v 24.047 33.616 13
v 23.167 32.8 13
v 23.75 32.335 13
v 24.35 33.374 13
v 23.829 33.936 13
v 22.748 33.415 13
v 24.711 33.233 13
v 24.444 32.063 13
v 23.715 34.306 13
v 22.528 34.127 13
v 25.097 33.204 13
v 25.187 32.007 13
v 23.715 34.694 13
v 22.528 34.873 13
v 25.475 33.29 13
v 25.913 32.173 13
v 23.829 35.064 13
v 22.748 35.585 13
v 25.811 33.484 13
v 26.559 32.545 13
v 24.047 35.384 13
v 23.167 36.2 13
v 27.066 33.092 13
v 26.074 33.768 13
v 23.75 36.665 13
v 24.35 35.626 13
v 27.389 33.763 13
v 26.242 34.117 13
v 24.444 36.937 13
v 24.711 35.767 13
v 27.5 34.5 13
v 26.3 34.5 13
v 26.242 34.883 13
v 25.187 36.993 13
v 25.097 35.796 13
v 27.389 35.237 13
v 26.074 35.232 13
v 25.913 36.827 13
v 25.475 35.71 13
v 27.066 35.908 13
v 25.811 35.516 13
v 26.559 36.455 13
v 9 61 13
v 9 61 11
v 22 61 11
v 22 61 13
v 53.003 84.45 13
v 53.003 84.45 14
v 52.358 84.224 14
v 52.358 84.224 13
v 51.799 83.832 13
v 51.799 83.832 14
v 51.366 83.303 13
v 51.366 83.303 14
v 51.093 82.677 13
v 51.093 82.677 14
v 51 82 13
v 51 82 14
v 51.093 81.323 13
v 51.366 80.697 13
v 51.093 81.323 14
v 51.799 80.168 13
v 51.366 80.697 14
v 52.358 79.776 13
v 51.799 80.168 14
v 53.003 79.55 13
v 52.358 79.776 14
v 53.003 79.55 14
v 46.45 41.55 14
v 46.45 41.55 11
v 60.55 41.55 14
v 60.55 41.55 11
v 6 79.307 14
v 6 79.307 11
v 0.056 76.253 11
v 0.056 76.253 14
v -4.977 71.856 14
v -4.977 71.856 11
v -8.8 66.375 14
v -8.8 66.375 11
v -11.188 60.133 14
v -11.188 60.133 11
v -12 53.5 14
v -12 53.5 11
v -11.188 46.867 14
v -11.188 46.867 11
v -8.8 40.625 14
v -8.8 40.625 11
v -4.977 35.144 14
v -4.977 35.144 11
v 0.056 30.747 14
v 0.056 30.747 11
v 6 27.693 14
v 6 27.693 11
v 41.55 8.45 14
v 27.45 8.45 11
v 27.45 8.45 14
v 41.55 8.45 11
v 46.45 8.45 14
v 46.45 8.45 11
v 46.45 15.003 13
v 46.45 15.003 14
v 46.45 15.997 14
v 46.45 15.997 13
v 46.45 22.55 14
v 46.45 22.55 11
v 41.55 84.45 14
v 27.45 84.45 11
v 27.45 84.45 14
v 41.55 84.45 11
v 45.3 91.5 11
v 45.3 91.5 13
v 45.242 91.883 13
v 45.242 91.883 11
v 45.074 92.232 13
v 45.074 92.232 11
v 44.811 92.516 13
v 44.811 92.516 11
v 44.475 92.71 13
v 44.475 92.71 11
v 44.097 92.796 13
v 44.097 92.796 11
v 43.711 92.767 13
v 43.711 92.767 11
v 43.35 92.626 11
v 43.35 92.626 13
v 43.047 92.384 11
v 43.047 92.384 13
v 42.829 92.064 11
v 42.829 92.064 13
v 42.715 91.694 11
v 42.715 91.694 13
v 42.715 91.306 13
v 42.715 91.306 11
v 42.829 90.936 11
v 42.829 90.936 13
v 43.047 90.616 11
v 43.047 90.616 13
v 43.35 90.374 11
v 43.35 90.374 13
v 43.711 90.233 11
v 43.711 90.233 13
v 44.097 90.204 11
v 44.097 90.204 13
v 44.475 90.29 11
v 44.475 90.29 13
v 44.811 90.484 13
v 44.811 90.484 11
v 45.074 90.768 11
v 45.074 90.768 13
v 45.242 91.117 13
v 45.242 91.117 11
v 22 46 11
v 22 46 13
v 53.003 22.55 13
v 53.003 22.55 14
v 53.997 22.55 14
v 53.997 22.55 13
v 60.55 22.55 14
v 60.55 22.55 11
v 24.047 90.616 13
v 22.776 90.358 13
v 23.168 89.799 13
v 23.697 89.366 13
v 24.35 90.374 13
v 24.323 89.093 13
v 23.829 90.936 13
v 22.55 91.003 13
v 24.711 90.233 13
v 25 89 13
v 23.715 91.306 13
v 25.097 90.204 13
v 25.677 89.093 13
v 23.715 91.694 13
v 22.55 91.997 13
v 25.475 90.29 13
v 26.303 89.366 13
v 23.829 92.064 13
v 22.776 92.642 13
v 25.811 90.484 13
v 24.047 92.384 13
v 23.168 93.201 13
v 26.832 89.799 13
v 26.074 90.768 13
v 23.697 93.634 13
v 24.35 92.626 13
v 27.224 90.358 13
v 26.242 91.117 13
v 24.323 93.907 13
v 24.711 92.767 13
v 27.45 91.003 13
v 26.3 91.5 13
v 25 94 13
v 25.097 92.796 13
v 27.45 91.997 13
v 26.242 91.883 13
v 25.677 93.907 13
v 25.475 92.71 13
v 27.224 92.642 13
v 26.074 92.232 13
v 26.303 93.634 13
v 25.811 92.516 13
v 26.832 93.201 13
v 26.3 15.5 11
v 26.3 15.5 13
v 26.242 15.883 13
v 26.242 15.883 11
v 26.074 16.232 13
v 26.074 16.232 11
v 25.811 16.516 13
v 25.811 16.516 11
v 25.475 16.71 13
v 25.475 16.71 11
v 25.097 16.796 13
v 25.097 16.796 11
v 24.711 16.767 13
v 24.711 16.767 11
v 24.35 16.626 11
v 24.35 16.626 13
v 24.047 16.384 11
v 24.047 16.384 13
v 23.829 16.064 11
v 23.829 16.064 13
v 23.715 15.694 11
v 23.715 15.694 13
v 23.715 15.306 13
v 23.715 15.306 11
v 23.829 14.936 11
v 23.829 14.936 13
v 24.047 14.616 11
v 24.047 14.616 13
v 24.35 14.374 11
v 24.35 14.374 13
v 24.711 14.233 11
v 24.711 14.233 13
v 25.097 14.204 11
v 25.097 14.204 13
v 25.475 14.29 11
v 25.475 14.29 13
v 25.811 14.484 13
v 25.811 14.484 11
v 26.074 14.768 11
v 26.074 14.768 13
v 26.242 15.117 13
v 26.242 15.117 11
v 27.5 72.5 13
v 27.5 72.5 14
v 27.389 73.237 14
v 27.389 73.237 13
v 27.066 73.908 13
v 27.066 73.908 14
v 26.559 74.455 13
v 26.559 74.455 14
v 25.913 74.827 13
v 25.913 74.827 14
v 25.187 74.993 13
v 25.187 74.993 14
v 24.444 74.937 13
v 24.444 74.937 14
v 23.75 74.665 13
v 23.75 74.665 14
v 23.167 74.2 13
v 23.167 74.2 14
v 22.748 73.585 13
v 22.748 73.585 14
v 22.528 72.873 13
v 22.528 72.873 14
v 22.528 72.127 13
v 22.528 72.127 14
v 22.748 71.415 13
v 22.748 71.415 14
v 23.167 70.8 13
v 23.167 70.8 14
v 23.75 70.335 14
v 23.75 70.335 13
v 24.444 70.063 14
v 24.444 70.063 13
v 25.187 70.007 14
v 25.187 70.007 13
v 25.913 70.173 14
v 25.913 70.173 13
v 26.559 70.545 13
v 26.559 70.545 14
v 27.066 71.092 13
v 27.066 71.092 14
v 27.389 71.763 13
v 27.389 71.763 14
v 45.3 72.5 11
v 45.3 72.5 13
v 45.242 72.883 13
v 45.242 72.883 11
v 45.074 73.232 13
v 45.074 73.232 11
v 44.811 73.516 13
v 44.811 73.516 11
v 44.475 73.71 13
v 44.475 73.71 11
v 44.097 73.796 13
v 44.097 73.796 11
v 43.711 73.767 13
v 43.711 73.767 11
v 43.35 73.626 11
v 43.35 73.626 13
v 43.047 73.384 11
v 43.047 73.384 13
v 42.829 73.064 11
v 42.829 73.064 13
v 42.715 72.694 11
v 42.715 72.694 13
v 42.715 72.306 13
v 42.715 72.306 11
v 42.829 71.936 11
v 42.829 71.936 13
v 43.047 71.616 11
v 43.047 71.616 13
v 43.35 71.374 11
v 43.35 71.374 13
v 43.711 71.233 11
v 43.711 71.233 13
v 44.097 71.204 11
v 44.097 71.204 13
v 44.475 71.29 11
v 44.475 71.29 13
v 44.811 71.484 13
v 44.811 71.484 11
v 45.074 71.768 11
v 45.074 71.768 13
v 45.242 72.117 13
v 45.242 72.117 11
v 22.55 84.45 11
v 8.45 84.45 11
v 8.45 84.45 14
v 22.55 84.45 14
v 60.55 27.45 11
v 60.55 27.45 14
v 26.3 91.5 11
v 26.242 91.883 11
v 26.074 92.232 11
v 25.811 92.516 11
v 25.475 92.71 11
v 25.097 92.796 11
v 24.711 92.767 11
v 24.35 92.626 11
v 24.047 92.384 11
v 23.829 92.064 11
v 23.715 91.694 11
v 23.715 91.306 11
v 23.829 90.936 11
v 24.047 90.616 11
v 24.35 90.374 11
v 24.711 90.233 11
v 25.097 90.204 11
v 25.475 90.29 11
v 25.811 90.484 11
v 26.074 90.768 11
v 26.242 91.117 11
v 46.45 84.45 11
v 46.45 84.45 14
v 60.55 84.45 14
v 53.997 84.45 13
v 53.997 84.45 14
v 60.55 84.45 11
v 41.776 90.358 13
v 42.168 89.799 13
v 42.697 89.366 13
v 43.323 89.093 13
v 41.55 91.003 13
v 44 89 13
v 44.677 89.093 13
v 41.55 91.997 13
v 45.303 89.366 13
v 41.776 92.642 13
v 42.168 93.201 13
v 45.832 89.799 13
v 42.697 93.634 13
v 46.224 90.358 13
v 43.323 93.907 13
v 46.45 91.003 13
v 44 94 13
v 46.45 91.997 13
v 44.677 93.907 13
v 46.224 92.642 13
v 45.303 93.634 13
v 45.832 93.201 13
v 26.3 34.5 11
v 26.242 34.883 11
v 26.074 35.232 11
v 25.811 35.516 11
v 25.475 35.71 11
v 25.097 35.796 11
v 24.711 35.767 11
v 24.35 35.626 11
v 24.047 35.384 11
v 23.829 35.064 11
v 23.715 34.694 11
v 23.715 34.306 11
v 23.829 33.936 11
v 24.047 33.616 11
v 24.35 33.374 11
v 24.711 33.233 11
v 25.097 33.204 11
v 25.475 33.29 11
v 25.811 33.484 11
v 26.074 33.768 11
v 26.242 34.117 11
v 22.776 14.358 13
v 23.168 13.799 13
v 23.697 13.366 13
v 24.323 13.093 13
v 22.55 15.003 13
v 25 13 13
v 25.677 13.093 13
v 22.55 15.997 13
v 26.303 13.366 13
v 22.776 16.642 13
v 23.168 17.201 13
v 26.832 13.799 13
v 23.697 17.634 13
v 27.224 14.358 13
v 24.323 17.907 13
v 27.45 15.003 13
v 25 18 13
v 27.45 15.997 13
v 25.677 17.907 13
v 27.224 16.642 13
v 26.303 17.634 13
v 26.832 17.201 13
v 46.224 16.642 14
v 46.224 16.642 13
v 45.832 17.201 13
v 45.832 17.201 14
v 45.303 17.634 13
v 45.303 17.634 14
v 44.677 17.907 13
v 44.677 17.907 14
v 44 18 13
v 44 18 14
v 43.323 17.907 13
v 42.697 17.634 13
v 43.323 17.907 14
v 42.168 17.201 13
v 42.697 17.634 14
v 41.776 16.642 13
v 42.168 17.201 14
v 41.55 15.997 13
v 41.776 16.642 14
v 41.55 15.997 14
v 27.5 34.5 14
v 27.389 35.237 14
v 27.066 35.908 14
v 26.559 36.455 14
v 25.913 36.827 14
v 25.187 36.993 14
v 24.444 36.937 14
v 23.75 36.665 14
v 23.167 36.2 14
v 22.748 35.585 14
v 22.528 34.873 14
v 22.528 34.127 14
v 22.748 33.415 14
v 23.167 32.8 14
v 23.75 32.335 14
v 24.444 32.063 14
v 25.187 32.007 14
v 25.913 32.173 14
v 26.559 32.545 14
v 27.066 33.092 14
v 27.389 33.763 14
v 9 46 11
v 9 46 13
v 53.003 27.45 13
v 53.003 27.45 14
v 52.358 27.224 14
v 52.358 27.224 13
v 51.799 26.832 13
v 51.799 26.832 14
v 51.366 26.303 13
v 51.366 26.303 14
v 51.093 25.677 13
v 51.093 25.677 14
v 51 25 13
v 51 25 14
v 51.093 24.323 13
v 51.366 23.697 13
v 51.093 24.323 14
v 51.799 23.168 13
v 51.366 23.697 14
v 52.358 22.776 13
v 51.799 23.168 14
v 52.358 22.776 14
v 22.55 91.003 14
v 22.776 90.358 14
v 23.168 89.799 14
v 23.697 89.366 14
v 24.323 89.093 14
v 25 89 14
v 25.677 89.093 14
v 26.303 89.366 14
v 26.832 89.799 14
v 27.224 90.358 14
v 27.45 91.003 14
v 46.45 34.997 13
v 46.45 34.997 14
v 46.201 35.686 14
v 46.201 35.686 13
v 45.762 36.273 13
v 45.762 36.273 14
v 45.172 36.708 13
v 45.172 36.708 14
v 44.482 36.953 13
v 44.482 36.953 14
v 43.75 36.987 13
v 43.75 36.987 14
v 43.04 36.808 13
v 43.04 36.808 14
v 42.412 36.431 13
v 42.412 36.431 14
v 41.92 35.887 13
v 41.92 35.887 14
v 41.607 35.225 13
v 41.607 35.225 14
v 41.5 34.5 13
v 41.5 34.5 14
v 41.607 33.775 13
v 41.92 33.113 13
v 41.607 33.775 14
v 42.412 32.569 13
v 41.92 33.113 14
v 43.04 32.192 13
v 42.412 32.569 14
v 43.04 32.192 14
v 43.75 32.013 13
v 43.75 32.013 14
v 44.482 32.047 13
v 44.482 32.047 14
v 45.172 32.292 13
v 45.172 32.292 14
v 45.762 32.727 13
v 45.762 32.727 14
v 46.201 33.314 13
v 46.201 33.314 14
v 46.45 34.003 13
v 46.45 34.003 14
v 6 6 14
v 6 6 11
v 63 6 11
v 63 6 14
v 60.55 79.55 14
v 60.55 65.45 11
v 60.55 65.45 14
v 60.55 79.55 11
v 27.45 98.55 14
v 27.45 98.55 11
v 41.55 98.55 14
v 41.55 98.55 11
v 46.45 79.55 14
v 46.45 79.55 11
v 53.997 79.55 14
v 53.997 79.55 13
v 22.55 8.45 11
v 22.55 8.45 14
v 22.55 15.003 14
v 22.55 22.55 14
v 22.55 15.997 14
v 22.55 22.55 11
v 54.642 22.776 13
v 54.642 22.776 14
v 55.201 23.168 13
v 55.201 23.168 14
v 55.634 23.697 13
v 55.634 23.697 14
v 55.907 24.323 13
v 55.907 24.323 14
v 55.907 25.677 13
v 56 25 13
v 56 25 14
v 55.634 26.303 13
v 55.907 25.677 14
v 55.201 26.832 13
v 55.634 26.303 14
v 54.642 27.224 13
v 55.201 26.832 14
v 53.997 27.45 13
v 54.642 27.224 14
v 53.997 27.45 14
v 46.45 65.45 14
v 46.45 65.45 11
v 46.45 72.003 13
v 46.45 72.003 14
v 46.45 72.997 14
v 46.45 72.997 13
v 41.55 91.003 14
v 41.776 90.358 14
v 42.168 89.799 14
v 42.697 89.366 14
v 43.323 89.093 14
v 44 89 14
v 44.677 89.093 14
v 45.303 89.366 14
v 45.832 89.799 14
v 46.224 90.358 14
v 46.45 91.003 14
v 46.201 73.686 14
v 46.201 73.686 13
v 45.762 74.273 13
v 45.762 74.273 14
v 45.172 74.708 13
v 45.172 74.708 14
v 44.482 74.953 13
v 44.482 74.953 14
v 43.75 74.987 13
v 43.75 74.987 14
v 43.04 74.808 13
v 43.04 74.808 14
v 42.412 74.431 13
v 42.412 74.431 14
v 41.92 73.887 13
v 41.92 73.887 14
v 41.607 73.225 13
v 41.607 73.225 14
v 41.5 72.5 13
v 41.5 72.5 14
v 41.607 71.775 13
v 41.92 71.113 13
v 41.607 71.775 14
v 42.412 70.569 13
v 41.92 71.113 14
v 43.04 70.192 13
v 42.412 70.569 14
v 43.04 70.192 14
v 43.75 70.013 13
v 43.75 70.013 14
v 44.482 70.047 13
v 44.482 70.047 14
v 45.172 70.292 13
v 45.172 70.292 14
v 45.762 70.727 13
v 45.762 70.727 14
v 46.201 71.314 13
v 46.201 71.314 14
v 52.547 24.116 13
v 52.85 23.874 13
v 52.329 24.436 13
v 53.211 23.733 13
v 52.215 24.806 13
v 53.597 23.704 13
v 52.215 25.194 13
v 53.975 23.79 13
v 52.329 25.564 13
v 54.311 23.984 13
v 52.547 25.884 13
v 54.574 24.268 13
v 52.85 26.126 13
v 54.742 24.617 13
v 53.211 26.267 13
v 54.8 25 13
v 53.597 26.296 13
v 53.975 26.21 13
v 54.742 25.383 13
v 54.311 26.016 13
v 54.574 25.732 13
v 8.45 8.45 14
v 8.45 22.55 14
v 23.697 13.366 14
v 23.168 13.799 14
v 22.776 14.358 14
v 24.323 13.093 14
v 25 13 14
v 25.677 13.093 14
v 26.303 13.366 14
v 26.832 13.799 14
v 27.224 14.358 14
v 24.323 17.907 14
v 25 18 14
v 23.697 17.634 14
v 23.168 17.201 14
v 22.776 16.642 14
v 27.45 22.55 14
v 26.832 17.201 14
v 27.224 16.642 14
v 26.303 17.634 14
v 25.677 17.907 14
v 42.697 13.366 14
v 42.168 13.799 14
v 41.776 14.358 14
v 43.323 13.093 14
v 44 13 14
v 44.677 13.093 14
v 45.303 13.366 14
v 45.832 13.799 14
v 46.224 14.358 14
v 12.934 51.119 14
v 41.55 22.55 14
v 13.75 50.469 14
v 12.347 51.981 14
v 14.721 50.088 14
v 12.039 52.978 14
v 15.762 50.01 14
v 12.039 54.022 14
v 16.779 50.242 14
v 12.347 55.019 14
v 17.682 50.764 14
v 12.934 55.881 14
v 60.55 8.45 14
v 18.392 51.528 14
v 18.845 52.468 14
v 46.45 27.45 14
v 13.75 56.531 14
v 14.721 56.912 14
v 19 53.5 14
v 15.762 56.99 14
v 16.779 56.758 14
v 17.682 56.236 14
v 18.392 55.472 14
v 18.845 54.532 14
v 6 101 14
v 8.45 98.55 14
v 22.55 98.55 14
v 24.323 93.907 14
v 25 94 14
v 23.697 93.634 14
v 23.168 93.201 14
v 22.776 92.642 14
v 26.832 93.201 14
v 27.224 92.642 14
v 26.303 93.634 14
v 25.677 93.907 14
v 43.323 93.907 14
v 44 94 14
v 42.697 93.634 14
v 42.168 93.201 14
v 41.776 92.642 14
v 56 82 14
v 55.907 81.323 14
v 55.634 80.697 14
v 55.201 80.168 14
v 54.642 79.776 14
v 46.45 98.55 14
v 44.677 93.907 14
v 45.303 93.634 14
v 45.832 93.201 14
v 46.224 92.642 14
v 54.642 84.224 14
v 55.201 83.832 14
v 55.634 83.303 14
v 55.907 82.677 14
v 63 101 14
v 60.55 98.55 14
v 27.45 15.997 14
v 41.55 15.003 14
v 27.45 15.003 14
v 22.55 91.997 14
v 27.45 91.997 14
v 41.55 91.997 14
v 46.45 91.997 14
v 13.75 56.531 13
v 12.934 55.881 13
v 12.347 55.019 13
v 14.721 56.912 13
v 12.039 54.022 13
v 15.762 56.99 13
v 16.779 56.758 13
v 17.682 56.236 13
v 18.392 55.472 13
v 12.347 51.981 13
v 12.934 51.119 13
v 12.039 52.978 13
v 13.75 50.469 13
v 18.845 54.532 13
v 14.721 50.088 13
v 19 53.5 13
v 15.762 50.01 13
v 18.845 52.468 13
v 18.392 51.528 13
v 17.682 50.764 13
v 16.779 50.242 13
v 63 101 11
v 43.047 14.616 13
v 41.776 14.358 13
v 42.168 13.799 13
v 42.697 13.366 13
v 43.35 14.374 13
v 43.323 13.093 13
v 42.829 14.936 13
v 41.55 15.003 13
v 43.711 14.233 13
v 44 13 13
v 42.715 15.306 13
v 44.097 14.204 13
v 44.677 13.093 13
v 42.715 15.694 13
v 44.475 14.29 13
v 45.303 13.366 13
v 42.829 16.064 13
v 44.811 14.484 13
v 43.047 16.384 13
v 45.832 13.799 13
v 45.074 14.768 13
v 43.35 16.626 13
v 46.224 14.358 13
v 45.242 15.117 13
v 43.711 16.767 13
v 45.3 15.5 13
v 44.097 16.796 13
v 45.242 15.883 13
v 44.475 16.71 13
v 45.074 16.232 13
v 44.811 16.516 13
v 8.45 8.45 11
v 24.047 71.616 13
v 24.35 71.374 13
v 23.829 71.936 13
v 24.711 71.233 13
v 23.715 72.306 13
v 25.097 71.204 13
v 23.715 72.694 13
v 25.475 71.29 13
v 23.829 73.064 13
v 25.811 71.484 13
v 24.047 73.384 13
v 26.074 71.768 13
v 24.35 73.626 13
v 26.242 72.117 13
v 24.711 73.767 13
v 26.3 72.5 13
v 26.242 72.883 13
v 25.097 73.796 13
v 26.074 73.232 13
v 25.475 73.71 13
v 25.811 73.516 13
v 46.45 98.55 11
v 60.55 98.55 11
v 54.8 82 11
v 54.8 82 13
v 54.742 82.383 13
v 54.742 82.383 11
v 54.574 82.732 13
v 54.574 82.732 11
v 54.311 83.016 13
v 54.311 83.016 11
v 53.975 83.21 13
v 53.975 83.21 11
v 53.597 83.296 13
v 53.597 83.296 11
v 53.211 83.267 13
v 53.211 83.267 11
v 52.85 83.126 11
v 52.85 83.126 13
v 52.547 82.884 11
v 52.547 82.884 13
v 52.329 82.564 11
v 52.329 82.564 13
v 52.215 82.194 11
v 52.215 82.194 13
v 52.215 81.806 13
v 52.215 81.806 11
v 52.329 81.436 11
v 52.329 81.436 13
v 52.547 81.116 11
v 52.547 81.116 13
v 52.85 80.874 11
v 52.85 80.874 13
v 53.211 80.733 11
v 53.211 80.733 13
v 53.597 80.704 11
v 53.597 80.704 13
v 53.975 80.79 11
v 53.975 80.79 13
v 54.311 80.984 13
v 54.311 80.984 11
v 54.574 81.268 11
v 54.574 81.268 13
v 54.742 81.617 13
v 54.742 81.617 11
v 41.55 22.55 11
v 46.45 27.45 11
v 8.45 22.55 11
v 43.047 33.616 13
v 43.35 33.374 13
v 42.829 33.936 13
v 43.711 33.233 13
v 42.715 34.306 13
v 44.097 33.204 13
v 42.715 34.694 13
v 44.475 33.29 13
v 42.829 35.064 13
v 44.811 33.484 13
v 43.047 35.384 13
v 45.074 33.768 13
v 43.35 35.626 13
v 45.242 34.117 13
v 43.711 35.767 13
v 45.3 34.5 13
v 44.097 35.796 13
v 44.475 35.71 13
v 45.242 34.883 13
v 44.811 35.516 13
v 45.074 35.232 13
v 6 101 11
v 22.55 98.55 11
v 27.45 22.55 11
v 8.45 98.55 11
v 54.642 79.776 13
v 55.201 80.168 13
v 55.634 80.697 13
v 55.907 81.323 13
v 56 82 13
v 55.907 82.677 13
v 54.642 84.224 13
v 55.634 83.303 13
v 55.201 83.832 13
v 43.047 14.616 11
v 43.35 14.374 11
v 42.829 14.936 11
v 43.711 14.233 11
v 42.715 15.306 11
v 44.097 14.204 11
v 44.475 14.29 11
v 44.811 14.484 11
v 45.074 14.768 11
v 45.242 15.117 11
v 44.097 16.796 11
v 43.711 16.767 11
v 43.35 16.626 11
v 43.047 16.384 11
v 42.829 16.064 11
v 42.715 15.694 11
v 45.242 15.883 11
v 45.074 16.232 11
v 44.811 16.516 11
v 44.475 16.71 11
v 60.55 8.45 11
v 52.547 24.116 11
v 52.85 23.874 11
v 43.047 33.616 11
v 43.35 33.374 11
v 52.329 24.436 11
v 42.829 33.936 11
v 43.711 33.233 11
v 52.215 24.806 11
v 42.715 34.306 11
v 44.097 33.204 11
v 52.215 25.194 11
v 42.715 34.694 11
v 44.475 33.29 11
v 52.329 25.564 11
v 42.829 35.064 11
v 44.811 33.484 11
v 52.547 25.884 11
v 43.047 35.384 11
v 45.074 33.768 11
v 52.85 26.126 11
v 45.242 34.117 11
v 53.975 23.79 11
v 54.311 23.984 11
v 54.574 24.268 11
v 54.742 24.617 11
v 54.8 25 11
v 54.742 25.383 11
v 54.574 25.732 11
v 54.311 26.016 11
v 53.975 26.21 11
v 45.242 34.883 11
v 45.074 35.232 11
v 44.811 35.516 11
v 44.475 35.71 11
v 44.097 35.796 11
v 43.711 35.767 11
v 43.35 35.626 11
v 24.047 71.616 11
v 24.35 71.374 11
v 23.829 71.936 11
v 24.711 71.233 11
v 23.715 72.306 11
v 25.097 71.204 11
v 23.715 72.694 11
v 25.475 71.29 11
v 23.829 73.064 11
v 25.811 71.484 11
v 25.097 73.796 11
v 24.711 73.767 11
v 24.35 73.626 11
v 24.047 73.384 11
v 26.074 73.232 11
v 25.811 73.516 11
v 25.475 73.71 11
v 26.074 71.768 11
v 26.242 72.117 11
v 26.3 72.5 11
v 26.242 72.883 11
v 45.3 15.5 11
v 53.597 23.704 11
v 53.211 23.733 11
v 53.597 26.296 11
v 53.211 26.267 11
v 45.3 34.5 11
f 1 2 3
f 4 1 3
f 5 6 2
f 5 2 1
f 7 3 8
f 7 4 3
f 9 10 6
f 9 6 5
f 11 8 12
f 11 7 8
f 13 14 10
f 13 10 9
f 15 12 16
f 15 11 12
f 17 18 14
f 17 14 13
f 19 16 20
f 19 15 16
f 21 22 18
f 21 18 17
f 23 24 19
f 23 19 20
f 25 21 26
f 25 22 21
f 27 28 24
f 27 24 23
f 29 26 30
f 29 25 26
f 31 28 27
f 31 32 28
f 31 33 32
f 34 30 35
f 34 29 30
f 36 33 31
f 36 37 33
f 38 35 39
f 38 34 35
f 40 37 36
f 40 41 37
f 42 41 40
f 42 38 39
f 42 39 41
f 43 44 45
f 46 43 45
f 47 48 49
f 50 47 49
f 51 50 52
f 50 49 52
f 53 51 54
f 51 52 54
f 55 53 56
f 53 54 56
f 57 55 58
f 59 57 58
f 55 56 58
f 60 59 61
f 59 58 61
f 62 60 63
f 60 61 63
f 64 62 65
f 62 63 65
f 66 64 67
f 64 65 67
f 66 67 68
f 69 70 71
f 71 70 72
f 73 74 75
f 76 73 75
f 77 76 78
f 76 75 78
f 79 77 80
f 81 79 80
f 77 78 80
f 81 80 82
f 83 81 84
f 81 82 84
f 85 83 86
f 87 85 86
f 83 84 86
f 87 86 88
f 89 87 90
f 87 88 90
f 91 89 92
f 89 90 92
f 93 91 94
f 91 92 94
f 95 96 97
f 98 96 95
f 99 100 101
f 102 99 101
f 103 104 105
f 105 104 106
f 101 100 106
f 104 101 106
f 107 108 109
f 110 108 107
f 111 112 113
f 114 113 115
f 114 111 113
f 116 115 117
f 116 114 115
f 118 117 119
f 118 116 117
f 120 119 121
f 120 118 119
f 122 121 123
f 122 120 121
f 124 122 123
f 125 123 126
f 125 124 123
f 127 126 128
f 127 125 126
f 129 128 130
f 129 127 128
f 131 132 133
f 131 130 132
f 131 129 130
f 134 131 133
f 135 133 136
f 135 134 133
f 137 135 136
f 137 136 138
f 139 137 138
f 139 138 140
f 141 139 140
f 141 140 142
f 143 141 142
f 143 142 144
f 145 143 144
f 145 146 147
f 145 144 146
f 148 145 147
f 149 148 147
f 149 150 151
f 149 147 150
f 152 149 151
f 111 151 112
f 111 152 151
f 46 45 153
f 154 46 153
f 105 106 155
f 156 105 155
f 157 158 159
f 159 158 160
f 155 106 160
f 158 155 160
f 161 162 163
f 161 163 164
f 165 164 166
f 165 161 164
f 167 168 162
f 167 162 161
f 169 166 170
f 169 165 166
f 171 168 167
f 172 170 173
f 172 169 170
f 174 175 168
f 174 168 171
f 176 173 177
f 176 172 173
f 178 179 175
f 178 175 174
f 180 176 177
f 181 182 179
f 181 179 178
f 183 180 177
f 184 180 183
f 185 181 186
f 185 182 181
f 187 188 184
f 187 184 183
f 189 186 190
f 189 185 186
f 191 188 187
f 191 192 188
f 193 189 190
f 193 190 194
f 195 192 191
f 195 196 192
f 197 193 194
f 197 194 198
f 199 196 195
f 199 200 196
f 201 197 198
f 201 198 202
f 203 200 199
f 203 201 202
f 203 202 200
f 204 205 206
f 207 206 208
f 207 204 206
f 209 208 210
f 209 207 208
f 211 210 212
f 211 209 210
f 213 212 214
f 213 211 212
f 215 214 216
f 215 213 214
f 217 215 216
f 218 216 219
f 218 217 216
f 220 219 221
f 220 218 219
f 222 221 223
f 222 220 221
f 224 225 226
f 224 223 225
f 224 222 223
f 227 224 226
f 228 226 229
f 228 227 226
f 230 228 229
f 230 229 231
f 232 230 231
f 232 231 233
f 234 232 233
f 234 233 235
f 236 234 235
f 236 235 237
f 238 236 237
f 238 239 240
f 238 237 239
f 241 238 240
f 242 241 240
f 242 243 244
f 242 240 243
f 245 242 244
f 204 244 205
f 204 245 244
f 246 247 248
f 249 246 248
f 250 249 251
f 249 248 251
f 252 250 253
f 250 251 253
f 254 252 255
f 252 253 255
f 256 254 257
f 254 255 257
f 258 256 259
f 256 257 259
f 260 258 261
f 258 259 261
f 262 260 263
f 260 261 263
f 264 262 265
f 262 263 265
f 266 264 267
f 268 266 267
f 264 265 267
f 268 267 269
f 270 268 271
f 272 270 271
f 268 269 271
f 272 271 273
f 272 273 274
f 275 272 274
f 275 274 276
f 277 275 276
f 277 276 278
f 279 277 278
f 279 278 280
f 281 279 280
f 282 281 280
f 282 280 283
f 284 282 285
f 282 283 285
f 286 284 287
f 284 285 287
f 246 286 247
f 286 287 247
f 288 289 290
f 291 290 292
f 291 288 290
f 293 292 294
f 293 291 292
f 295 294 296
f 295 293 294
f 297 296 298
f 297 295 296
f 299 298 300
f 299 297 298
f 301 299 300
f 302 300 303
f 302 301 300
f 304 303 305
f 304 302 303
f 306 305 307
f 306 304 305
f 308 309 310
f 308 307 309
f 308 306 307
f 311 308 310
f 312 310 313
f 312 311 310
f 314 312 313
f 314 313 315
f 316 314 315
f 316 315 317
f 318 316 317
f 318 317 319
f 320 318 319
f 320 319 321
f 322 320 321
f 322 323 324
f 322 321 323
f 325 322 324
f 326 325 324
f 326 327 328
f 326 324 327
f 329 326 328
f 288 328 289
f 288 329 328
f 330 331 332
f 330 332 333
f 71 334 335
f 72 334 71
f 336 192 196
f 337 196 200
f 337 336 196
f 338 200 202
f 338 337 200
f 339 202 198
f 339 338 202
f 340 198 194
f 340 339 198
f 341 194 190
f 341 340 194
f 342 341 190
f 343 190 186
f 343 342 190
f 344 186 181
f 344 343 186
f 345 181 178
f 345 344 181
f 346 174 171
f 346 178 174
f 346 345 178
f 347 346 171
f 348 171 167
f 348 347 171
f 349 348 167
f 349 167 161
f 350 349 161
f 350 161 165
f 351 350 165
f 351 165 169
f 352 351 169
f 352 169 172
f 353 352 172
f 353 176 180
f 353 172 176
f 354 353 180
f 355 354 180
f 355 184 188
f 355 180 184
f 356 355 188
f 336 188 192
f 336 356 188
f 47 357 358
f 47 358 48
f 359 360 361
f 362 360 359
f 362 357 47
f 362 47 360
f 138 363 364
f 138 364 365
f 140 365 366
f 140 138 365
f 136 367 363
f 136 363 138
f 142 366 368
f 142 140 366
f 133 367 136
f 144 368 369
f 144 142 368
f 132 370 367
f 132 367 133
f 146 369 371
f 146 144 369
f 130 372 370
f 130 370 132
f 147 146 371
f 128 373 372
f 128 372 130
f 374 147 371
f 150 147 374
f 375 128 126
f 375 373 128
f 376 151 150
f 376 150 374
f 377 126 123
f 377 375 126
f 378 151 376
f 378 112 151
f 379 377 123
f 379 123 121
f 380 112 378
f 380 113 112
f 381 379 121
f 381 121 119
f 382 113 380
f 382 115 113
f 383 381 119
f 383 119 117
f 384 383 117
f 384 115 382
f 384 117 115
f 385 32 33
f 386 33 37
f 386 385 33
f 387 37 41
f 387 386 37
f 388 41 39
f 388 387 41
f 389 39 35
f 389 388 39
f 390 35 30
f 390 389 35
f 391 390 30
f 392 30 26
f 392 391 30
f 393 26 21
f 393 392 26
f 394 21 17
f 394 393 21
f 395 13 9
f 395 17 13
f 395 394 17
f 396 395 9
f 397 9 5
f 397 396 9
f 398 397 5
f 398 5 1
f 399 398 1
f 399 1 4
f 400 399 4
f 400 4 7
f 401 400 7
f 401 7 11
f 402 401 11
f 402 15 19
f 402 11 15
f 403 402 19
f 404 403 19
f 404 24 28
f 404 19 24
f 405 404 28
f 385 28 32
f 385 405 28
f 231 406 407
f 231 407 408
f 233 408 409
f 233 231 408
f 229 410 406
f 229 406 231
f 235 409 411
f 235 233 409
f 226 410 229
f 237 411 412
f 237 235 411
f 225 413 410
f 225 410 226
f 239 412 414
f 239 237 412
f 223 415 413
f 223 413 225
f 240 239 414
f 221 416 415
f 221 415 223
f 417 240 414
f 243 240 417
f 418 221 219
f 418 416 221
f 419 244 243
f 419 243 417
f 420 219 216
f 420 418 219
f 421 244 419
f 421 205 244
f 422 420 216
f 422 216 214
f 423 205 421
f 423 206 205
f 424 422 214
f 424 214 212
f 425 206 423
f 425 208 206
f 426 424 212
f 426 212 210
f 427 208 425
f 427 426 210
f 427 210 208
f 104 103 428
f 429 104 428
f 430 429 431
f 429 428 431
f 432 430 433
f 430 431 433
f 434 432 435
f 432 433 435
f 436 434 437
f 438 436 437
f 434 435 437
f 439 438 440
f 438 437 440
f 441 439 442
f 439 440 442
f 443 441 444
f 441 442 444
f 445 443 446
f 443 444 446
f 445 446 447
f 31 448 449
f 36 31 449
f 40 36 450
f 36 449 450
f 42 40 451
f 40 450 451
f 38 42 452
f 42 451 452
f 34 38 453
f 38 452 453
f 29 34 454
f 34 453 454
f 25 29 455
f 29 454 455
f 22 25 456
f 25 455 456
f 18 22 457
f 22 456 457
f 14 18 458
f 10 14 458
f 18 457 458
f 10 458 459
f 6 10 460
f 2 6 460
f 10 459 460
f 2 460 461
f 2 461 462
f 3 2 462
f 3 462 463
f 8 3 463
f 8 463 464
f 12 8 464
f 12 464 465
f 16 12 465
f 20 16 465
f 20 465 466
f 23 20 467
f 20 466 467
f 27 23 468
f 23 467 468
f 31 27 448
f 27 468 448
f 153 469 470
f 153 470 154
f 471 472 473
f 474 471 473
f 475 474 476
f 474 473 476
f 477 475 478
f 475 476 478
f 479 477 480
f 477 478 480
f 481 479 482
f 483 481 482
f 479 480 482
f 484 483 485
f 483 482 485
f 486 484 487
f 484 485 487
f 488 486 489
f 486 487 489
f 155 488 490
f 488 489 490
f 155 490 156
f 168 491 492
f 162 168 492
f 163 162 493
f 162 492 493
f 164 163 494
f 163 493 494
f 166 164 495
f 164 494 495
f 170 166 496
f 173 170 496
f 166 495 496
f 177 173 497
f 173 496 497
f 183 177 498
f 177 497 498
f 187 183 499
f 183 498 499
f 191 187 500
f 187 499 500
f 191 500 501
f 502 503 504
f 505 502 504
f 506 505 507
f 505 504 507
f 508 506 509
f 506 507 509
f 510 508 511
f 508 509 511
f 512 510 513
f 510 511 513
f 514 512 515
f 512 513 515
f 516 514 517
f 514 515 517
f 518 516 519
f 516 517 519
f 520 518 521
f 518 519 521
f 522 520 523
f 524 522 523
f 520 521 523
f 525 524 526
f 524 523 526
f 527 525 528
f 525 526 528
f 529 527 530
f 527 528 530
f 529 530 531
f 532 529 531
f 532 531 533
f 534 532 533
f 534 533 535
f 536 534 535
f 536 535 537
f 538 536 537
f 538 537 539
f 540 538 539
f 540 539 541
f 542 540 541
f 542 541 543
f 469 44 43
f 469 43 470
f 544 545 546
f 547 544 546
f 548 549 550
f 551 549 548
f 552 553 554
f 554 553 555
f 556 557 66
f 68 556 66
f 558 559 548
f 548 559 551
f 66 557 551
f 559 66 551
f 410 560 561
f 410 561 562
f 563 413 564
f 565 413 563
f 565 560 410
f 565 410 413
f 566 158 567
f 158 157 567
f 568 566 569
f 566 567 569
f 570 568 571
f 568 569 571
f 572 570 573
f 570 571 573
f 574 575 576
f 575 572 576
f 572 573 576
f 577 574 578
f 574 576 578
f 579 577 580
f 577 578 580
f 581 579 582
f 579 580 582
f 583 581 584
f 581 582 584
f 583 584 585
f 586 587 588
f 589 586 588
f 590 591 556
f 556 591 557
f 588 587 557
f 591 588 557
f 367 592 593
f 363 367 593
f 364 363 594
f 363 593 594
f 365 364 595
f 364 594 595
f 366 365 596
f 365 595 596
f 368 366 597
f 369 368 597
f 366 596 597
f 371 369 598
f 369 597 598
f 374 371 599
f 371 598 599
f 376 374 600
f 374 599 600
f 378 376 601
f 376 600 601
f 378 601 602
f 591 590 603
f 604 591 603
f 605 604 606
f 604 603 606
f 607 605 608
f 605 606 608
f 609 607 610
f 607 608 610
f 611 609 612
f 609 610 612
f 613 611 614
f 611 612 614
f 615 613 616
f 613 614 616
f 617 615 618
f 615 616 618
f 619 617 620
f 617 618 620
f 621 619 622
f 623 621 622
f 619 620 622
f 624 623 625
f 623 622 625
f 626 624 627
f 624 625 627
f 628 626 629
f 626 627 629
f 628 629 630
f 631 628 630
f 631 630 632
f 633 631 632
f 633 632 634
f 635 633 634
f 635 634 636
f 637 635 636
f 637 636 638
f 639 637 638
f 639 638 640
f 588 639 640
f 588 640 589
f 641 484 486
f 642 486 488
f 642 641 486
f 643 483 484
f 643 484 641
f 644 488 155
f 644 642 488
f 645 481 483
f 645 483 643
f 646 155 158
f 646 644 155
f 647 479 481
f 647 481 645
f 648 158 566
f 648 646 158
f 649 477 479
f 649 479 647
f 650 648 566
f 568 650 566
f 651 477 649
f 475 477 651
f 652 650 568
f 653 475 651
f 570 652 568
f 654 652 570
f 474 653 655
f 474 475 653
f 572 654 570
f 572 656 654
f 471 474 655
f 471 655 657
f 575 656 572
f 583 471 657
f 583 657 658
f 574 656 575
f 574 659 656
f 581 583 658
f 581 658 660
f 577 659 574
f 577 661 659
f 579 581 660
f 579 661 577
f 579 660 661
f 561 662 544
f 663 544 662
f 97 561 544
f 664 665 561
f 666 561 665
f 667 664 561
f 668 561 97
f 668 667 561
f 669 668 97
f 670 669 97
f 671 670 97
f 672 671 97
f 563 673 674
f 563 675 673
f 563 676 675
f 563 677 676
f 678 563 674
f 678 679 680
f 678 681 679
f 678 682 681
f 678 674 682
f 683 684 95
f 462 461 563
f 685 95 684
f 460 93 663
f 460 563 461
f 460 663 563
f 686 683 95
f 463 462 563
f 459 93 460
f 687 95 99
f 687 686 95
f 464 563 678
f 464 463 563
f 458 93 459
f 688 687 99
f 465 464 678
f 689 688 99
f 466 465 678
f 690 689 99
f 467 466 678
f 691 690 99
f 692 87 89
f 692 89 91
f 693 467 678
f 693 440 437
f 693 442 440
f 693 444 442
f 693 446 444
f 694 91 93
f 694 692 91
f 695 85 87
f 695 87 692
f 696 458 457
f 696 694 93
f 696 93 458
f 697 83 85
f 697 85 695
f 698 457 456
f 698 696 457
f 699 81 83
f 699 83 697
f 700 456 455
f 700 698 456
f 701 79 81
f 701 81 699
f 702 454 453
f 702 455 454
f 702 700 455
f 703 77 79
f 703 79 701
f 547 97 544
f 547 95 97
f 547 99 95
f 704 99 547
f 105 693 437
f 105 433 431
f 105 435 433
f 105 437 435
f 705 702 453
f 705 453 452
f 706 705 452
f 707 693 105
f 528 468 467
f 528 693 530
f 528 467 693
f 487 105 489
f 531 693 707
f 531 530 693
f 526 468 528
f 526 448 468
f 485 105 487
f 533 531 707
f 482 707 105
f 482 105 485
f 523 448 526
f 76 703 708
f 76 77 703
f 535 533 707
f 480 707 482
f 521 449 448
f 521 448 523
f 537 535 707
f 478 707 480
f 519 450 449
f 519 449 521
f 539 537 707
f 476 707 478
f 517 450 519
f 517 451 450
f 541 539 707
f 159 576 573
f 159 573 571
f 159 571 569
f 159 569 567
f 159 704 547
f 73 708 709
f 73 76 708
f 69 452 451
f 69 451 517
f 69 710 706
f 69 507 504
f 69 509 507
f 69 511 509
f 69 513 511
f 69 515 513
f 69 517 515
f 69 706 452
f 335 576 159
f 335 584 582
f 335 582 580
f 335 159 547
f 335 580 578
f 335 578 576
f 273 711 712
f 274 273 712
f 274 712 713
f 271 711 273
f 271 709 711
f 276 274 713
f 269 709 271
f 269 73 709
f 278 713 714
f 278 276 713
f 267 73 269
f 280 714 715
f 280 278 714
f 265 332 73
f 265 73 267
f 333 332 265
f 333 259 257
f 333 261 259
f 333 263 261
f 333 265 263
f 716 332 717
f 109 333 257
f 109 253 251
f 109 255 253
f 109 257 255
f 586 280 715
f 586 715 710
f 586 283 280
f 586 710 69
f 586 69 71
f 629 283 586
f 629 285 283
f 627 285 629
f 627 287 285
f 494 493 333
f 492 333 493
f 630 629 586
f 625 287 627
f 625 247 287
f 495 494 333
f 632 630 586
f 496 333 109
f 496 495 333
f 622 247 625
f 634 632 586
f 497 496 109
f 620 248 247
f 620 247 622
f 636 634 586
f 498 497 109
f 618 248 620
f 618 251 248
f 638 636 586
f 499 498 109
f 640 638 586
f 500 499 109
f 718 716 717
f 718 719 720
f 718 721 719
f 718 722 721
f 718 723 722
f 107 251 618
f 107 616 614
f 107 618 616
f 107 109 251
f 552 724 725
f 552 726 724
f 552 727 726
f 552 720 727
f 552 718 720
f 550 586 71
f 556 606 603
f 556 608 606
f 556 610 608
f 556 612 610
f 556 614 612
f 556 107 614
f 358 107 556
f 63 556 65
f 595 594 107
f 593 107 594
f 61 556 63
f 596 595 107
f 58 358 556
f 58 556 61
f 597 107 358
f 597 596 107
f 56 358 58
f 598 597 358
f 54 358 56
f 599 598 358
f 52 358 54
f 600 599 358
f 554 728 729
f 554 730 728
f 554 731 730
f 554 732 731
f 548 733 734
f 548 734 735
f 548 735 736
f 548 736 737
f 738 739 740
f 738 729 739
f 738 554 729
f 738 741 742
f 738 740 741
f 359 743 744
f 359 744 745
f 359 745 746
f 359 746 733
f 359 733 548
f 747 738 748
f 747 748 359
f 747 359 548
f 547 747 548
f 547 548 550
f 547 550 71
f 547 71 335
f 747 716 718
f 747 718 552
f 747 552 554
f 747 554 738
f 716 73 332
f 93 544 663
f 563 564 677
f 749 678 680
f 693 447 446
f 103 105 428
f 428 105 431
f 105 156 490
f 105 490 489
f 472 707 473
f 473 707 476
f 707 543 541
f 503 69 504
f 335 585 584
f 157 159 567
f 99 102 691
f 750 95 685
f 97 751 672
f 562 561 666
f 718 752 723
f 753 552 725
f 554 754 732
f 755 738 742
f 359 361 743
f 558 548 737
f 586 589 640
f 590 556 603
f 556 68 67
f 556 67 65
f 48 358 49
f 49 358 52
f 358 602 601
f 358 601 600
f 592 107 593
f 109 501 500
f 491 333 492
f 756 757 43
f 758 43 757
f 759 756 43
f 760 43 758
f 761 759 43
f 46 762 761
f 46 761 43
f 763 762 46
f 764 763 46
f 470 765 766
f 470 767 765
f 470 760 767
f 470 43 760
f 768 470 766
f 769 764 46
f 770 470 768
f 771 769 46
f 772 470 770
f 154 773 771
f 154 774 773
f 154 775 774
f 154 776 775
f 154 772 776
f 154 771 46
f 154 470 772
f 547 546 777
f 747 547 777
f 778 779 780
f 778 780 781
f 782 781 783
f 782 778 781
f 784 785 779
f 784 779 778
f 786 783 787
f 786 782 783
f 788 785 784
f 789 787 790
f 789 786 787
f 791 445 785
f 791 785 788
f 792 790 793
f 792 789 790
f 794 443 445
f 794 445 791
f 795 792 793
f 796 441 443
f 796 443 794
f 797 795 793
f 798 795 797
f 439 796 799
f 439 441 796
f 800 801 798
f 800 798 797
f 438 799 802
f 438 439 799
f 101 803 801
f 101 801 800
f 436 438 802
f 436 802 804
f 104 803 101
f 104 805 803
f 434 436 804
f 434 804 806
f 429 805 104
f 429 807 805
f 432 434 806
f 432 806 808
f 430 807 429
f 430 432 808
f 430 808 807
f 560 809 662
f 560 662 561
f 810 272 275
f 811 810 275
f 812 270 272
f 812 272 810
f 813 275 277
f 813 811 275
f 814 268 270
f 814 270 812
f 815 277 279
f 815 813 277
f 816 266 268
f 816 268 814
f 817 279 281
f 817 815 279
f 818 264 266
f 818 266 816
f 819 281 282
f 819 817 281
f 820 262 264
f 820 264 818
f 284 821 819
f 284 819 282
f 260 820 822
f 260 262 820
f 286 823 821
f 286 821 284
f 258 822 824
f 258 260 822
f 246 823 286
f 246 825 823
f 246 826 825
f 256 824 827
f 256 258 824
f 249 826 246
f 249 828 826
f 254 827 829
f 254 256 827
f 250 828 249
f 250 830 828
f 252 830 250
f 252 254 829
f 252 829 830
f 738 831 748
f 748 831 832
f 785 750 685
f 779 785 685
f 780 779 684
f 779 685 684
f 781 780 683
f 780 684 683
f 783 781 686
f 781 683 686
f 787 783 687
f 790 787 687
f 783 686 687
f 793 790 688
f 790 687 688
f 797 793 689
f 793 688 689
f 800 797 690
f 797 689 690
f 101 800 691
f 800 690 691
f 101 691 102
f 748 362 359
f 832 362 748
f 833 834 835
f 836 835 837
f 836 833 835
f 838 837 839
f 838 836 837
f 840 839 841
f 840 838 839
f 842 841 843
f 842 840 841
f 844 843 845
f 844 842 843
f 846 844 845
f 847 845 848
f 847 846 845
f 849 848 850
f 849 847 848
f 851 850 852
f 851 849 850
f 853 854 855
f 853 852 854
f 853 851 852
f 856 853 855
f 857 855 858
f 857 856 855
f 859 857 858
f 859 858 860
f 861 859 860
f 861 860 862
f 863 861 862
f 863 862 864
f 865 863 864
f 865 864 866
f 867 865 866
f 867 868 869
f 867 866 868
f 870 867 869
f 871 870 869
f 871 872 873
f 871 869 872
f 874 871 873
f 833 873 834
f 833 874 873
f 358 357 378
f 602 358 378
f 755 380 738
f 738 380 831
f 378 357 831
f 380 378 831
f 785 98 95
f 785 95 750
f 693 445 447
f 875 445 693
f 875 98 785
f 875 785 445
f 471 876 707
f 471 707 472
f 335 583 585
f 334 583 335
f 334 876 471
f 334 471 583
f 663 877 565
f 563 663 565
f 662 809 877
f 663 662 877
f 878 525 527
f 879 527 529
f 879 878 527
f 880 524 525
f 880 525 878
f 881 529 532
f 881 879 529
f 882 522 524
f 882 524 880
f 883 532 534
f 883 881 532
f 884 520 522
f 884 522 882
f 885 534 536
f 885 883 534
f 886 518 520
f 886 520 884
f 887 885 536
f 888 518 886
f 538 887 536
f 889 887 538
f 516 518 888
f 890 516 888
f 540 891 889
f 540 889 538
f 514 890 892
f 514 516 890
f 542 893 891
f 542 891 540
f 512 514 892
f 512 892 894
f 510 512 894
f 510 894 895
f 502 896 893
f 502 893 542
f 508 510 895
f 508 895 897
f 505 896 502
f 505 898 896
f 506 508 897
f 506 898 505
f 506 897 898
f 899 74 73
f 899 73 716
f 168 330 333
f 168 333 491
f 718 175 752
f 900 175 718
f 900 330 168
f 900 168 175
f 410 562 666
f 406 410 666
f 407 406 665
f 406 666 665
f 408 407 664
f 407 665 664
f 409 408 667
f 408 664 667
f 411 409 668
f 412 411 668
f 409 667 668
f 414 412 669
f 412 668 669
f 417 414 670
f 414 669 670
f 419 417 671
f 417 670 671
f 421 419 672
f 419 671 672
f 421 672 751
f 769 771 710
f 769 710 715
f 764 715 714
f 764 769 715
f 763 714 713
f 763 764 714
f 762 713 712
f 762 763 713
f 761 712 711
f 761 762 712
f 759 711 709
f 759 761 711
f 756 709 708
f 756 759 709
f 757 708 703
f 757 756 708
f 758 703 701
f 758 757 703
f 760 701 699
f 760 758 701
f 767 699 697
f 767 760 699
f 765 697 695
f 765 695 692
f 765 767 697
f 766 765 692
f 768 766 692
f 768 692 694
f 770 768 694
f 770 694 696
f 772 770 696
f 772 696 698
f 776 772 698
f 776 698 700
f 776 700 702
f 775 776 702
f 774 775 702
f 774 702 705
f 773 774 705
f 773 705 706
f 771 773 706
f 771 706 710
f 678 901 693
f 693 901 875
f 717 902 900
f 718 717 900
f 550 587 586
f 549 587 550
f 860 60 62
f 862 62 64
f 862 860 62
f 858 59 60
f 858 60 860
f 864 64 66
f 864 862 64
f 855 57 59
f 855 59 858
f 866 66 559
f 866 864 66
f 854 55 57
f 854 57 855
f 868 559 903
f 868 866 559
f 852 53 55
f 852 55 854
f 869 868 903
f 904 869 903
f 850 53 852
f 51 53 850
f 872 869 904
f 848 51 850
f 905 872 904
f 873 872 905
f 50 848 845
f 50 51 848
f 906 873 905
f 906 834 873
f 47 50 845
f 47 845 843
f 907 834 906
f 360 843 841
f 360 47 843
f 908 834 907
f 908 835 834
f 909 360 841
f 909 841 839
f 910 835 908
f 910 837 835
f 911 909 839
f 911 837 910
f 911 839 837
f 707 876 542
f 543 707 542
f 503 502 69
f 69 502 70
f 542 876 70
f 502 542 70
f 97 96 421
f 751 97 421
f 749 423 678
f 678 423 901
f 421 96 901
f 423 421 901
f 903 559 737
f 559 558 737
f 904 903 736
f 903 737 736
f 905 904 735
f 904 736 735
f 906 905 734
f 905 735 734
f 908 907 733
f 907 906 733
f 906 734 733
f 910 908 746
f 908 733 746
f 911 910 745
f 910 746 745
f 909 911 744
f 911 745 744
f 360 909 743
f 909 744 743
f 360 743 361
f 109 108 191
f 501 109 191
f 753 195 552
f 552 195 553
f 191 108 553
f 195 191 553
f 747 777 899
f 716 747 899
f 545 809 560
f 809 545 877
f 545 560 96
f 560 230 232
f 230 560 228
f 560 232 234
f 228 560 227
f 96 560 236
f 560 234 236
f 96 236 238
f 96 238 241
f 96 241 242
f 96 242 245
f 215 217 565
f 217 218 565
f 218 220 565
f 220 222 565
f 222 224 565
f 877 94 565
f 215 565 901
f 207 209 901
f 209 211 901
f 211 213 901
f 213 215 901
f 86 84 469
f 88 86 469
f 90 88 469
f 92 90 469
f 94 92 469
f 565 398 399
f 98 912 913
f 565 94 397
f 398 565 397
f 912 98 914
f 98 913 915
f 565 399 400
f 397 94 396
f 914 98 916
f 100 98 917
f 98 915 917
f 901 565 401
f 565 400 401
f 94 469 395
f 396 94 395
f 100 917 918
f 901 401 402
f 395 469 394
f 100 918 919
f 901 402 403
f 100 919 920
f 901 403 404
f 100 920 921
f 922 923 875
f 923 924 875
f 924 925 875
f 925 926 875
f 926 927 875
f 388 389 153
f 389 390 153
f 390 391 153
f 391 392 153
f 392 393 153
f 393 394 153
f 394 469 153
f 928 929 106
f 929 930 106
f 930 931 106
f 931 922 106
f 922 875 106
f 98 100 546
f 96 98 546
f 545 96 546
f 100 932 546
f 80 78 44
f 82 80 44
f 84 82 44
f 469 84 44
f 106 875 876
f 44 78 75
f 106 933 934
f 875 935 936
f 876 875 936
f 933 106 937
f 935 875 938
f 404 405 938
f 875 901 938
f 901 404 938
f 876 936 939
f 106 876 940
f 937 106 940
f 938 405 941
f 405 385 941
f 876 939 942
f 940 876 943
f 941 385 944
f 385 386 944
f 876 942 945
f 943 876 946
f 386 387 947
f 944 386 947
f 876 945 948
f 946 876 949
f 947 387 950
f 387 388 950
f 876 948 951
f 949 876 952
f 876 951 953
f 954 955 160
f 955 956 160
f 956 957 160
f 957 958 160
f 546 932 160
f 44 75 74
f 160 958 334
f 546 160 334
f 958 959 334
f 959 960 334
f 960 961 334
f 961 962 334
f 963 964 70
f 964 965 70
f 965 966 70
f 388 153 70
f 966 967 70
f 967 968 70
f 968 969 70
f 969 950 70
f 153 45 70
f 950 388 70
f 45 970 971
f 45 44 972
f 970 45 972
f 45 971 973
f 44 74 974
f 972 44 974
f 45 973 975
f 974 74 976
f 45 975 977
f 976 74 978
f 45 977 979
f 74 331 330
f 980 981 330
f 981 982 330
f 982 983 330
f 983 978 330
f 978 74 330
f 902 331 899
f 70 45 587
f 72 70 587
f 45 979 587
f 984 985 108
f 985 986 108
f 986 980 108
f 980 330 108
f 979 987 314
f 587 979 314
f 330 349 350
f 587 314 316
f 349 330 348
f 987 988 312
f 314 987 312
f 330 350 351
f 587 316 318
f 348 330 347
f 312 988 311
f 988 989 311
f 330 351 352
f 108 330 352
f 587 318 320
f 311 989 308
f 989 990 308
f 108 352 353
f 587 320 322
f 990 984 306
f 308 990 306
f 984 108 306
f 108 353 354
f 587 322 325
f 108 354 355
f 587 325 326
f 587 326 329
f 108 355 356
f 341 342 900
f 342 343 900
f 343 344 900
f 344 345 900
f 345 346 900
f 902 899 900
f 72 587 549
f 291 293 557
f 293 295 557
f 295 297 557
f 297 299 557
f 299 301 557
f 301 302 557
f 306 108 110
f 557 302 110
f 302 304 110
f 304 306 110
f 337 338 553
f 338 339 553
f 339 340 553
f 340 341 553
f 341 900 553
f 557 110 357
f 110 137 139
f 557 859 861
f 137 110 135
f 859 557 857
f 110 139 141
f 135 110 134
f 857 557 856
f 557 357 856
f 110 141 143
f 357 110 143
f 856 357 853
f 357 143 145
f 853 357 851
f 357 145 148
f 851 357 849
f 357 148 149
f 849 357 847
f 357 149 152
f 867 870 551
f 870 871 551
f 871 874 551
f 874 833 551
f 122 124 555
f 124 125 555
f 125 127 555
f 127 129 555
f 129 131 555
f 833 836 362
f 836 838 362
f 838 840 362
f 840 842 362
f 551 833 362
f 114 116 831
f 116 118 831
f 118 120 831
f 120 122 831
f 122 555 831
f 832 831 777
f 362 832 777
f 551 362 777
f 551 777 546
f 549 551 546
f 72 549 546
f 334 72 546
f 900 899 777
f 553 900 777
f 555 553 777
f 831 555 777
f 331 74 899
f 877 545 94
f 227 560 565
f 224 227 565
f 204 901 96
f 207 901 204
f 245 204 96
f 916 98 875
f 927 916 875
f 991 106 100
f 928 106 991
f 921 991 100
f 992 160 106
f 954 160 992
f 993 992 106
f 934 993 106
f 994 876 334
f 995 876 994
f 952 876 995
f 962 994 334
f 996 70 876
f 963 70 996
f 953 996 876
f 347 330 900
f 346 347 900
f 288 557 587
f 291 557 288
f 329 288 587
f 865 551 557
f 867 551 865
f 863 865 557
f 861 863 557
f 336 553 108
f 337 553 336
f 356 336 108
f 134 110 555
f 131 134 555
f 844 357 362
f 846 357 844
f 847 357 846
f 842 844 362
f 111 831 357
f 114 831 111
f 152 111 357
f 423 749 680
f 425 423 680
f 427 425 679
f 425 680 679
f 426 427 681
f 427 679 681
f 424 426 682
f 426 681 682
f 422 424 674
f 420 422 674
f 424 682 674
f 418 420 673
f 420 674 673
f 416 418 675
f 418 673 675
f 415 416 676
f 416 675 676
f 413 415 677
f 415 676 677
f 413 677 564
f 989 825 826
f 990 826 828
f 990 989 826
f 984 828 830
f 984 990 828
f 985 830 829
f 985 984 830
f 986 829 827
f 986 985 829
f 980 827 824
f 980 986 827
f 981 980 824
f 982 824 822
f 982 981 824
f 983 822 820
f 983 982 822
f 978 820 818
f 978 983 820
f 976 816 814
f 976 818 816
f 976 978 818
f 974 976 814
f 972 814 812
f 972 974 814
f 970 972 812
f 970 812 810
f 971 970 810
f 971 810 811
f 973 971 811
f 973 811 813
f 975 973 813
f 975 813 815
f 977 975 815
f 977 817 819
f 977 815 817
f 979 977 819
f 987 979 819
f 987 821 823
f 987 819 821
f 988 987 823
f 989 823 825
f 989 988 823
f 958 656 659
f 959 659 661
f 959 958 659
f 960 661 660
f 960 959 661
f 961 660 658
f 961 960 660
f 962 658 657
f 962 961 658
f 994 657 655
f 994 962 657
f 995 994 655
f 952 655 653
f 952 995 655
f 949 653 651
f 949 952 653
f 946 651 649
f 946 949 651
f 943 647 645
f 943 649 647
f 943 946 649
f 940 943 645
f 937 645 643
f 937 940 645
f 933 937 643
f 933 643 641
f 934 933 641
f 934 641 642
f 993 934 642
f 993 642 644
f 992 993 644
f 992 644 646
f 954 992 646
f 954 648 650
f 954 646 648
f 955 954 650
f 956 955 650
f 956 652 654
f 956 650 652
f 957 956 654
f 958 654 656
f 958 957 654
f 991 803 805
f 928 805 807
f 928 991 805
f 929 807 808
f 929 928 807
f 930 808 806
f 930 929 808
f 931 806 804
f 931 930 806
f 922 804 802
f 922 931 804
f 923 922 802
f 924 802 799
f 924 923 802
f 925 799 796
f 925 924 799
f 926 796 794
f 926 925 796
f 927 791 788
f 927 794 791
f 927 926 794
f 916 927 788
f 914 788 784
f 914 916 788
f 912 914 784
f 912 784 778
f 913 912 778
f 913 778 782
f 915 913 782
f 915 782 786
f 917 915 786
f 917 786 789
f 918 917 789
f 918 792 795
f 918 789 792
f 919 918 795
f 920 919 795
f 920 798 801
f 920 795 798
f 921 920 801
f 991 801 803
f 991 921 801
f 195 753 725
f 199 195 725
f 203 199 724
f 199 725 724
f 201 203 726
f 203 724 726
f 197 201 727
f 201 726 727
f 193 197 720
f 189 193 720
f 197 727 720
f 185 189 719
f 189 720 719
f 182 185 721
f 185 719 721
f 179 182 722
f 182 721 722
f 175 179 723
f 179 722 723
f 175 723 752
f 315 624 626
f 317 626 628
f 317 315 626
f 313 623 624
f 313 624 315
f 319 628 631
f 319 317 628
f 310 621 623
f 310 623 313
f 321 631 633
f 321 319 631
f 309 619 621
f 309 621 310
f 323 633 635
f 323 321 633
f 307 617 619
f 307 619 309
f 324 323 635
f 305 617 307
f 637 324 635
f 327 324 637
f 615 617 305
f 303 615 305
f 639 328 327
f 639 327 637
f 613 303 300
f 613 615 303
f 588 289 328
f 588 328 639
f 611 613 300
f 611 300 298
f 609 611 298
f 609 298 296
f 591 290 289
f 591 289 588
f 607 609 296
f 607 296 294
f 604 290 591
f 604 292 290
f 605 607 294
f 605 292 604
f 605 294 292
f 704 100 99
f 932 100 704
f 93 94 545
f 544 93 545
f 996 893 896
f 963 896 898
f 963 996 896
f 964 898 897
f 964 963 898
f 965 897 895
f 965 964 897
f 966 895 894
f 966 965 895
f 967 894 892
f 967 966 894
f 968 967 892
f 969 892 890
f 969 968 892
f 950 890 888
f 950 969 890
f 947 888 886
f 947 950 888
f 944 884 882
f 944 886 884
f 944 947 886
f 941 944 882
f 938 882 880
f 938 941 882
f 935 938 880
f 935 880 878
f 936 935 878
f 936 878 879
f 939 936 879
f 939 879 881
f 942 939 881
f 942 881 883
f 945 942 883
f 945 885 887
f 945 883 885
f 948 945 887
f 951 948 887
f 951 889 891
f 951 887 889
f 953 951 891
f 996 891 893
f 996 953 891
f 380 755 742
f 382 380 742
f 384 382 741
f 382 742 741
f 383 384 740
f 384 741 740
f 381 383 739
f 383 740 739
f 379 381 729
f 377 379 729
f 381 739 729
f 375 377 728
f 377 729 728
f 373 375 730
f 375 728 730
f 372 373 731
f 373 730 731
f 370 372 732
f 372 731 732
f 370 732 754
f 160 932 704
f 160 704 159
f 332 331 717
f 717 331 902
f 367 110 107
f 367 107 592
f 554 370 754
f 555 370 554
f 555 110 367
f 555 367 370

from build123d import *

# Parameters (mm, degrees)
SKETCH014_R     = 3.5
SKETCH014_R_2   = 1.3
SKETCH014_W     = 14.1
SKETCH014_H     = 14.1
PAD004_DEPTH    = 3
SKETCH015_R     = 2.5
POCKET009_DEPTH = 1
SKETCH016_W     = 13
SKETCH016_H     = 15
POCKET010_DEPTH = 2


with BuildPart() as part:
    # Sketch014 → Pad004 (new body)
    with BuildSketch(Plane.XY):
        with BuildLine():
            Line((0, 0), (57, 0))
            Line((57, 0), (57, 95))
            Line((57, 95), (0, 95))
            Line((0, 73.306976), (0, 95))
            ThreePointArc((0, 73.306976), (-18, 47.5), (0, 21.693024))
            Line((0, 21.693024), (0, 0))
        make_face()
        with Locations((9.5, 47.5)):
            Circle(SKETCH014_R, mode=Mode.SUBTRACT)
        with Locations((19, 85.5)):
            Circle(SKETCH014_R_2, mode=Mode.SUBTRACT)
        with Locations((38, 85.5)):
            Circle(SKETCH014_R_2, mode=Mode.SUBTRACT)
        with Locations((38, 66.5)):
            Circle(SKETCH014_R_2, mode=Mode.SUBTRACT)
        with Locations((19, 66.5)):
            Circle(SKETCH014_R_2, mode=Mode.SUBTRACT)
        with Locations((38, 28.5)):
            Circle(SKETCH014_R_2, mode=Mode.SUBTRACT)
        with Locations((19, 28.5)):
            Circle(SKETCH014_R_2, mode=Mode.SUBTRACT)
        with Locations((19, 9.5)):
            Circle(SKETCH014_R_2, mode=Mode.SUBTRACT)
        with Locations((38, 9.5)):
            Circle(SKETCH014_R_2, mode=Mode.SUBTRACT)
        with Locations((47.5, 19)):
            Circle(SKETCH014_R_2, mode=Mode.SUBTRACT)
        with Locations((47.5, 76)):
            Circle(SKETCH014_R_2, mode=Mode.SUBTRACT)
        with Locations((9.5, 9.5)):
            Rectangle(SKETCH014_W, SKETCH014_H, mode=Mode.SUBTRACT)
        with Locations((28.5, 9.5)):
            Rectangle(SKETCH014_W, SKETCH014_H, mode=Mode.SUBTRACT)
        with Locations((47.5, 9.5)):
            Rectangle(SKETCH014_W, SKETCH014_H, mode=Mode.SUBTRACT)
        with Locations((47.5, 28.5)):
            Rectangle(SKETCH014_W, SKETCH014_H, mode=Mode.SUBTRACT)
        with Locations((47.5, 66.5)):
            Rectangle(SKETCH014_W, SKETCH014_H, mode=Mode.SUBTRACT)
        with Locations((47.5, 85.5)):
            Rectangle(SKETCH014_W, SKETCH014_H, mode=Mode.SUBTRACT)
        with Locations((28.5, 85.5)):
            Rectangle(SKETCH014_W, SKETCH014_H, mode=Mode.SUBTRACT)
        with Locations((9.5, 85.5)):
            Rectangle(SKETCH014_W, SKETCH014_H, mode=Mode.SUBTRACT)
    extrude(amount=PAD004_DEPTH)

    # Sketch015 (on Face51 of Pad004) → Pocket009 (cut)
    with BuildSketch(Plane.XY.offset(3)):
        with Locations((19, 28.5)):
            Circle(SKETCH015_R)
        with Locations((38, 28.5)):
            Circle(SKETCH015_R)
        with Locations((47.5, 19)):
            Circle(SKETCH015_R)
        with Locations((38, 9.5)):
            Circle(SKETCH015_R)
        with Locations((19, 9.5)):
            Circle(SKETCH015_R)
        with Locations((19, 66.5)):
            Circle(SKETCH015_R)
        with Locations((38, 85.5)):
            Circle(SKETCH015_R)
        with Locations((38, 66.5)):
            Circle(SKETCH015_R)
        with Locations((47.5, 76)):
            Circle(SKETCH015_R)
        with Locations((19, 85.5)):
            Circle(SKETCH015_R)
    extrude(amount=-POCKET009_DEPTH, mode=Mode.SUBTRACT)

    # Sketch016 (on Face4 of Pocket009) → Pocket010 (cut)
    with BuildSketch(Plane(origin=(0, 0, 0), x_dir=(1, 0, 0), z_dir=(0, 0, -1))):
        with Locations((9.5, -47.5)):
            Rectangle(SKETCH016_W, SKETCH016_H)
    extrude(amount=-POCKET010_DEPTH, mode=Mode.SUBTRACT)


with BuildPart() as part_1:
    # Body002 placement: moved
    add(part.part.moved(Location((6, 6, 11))))


solid = part_1.part
